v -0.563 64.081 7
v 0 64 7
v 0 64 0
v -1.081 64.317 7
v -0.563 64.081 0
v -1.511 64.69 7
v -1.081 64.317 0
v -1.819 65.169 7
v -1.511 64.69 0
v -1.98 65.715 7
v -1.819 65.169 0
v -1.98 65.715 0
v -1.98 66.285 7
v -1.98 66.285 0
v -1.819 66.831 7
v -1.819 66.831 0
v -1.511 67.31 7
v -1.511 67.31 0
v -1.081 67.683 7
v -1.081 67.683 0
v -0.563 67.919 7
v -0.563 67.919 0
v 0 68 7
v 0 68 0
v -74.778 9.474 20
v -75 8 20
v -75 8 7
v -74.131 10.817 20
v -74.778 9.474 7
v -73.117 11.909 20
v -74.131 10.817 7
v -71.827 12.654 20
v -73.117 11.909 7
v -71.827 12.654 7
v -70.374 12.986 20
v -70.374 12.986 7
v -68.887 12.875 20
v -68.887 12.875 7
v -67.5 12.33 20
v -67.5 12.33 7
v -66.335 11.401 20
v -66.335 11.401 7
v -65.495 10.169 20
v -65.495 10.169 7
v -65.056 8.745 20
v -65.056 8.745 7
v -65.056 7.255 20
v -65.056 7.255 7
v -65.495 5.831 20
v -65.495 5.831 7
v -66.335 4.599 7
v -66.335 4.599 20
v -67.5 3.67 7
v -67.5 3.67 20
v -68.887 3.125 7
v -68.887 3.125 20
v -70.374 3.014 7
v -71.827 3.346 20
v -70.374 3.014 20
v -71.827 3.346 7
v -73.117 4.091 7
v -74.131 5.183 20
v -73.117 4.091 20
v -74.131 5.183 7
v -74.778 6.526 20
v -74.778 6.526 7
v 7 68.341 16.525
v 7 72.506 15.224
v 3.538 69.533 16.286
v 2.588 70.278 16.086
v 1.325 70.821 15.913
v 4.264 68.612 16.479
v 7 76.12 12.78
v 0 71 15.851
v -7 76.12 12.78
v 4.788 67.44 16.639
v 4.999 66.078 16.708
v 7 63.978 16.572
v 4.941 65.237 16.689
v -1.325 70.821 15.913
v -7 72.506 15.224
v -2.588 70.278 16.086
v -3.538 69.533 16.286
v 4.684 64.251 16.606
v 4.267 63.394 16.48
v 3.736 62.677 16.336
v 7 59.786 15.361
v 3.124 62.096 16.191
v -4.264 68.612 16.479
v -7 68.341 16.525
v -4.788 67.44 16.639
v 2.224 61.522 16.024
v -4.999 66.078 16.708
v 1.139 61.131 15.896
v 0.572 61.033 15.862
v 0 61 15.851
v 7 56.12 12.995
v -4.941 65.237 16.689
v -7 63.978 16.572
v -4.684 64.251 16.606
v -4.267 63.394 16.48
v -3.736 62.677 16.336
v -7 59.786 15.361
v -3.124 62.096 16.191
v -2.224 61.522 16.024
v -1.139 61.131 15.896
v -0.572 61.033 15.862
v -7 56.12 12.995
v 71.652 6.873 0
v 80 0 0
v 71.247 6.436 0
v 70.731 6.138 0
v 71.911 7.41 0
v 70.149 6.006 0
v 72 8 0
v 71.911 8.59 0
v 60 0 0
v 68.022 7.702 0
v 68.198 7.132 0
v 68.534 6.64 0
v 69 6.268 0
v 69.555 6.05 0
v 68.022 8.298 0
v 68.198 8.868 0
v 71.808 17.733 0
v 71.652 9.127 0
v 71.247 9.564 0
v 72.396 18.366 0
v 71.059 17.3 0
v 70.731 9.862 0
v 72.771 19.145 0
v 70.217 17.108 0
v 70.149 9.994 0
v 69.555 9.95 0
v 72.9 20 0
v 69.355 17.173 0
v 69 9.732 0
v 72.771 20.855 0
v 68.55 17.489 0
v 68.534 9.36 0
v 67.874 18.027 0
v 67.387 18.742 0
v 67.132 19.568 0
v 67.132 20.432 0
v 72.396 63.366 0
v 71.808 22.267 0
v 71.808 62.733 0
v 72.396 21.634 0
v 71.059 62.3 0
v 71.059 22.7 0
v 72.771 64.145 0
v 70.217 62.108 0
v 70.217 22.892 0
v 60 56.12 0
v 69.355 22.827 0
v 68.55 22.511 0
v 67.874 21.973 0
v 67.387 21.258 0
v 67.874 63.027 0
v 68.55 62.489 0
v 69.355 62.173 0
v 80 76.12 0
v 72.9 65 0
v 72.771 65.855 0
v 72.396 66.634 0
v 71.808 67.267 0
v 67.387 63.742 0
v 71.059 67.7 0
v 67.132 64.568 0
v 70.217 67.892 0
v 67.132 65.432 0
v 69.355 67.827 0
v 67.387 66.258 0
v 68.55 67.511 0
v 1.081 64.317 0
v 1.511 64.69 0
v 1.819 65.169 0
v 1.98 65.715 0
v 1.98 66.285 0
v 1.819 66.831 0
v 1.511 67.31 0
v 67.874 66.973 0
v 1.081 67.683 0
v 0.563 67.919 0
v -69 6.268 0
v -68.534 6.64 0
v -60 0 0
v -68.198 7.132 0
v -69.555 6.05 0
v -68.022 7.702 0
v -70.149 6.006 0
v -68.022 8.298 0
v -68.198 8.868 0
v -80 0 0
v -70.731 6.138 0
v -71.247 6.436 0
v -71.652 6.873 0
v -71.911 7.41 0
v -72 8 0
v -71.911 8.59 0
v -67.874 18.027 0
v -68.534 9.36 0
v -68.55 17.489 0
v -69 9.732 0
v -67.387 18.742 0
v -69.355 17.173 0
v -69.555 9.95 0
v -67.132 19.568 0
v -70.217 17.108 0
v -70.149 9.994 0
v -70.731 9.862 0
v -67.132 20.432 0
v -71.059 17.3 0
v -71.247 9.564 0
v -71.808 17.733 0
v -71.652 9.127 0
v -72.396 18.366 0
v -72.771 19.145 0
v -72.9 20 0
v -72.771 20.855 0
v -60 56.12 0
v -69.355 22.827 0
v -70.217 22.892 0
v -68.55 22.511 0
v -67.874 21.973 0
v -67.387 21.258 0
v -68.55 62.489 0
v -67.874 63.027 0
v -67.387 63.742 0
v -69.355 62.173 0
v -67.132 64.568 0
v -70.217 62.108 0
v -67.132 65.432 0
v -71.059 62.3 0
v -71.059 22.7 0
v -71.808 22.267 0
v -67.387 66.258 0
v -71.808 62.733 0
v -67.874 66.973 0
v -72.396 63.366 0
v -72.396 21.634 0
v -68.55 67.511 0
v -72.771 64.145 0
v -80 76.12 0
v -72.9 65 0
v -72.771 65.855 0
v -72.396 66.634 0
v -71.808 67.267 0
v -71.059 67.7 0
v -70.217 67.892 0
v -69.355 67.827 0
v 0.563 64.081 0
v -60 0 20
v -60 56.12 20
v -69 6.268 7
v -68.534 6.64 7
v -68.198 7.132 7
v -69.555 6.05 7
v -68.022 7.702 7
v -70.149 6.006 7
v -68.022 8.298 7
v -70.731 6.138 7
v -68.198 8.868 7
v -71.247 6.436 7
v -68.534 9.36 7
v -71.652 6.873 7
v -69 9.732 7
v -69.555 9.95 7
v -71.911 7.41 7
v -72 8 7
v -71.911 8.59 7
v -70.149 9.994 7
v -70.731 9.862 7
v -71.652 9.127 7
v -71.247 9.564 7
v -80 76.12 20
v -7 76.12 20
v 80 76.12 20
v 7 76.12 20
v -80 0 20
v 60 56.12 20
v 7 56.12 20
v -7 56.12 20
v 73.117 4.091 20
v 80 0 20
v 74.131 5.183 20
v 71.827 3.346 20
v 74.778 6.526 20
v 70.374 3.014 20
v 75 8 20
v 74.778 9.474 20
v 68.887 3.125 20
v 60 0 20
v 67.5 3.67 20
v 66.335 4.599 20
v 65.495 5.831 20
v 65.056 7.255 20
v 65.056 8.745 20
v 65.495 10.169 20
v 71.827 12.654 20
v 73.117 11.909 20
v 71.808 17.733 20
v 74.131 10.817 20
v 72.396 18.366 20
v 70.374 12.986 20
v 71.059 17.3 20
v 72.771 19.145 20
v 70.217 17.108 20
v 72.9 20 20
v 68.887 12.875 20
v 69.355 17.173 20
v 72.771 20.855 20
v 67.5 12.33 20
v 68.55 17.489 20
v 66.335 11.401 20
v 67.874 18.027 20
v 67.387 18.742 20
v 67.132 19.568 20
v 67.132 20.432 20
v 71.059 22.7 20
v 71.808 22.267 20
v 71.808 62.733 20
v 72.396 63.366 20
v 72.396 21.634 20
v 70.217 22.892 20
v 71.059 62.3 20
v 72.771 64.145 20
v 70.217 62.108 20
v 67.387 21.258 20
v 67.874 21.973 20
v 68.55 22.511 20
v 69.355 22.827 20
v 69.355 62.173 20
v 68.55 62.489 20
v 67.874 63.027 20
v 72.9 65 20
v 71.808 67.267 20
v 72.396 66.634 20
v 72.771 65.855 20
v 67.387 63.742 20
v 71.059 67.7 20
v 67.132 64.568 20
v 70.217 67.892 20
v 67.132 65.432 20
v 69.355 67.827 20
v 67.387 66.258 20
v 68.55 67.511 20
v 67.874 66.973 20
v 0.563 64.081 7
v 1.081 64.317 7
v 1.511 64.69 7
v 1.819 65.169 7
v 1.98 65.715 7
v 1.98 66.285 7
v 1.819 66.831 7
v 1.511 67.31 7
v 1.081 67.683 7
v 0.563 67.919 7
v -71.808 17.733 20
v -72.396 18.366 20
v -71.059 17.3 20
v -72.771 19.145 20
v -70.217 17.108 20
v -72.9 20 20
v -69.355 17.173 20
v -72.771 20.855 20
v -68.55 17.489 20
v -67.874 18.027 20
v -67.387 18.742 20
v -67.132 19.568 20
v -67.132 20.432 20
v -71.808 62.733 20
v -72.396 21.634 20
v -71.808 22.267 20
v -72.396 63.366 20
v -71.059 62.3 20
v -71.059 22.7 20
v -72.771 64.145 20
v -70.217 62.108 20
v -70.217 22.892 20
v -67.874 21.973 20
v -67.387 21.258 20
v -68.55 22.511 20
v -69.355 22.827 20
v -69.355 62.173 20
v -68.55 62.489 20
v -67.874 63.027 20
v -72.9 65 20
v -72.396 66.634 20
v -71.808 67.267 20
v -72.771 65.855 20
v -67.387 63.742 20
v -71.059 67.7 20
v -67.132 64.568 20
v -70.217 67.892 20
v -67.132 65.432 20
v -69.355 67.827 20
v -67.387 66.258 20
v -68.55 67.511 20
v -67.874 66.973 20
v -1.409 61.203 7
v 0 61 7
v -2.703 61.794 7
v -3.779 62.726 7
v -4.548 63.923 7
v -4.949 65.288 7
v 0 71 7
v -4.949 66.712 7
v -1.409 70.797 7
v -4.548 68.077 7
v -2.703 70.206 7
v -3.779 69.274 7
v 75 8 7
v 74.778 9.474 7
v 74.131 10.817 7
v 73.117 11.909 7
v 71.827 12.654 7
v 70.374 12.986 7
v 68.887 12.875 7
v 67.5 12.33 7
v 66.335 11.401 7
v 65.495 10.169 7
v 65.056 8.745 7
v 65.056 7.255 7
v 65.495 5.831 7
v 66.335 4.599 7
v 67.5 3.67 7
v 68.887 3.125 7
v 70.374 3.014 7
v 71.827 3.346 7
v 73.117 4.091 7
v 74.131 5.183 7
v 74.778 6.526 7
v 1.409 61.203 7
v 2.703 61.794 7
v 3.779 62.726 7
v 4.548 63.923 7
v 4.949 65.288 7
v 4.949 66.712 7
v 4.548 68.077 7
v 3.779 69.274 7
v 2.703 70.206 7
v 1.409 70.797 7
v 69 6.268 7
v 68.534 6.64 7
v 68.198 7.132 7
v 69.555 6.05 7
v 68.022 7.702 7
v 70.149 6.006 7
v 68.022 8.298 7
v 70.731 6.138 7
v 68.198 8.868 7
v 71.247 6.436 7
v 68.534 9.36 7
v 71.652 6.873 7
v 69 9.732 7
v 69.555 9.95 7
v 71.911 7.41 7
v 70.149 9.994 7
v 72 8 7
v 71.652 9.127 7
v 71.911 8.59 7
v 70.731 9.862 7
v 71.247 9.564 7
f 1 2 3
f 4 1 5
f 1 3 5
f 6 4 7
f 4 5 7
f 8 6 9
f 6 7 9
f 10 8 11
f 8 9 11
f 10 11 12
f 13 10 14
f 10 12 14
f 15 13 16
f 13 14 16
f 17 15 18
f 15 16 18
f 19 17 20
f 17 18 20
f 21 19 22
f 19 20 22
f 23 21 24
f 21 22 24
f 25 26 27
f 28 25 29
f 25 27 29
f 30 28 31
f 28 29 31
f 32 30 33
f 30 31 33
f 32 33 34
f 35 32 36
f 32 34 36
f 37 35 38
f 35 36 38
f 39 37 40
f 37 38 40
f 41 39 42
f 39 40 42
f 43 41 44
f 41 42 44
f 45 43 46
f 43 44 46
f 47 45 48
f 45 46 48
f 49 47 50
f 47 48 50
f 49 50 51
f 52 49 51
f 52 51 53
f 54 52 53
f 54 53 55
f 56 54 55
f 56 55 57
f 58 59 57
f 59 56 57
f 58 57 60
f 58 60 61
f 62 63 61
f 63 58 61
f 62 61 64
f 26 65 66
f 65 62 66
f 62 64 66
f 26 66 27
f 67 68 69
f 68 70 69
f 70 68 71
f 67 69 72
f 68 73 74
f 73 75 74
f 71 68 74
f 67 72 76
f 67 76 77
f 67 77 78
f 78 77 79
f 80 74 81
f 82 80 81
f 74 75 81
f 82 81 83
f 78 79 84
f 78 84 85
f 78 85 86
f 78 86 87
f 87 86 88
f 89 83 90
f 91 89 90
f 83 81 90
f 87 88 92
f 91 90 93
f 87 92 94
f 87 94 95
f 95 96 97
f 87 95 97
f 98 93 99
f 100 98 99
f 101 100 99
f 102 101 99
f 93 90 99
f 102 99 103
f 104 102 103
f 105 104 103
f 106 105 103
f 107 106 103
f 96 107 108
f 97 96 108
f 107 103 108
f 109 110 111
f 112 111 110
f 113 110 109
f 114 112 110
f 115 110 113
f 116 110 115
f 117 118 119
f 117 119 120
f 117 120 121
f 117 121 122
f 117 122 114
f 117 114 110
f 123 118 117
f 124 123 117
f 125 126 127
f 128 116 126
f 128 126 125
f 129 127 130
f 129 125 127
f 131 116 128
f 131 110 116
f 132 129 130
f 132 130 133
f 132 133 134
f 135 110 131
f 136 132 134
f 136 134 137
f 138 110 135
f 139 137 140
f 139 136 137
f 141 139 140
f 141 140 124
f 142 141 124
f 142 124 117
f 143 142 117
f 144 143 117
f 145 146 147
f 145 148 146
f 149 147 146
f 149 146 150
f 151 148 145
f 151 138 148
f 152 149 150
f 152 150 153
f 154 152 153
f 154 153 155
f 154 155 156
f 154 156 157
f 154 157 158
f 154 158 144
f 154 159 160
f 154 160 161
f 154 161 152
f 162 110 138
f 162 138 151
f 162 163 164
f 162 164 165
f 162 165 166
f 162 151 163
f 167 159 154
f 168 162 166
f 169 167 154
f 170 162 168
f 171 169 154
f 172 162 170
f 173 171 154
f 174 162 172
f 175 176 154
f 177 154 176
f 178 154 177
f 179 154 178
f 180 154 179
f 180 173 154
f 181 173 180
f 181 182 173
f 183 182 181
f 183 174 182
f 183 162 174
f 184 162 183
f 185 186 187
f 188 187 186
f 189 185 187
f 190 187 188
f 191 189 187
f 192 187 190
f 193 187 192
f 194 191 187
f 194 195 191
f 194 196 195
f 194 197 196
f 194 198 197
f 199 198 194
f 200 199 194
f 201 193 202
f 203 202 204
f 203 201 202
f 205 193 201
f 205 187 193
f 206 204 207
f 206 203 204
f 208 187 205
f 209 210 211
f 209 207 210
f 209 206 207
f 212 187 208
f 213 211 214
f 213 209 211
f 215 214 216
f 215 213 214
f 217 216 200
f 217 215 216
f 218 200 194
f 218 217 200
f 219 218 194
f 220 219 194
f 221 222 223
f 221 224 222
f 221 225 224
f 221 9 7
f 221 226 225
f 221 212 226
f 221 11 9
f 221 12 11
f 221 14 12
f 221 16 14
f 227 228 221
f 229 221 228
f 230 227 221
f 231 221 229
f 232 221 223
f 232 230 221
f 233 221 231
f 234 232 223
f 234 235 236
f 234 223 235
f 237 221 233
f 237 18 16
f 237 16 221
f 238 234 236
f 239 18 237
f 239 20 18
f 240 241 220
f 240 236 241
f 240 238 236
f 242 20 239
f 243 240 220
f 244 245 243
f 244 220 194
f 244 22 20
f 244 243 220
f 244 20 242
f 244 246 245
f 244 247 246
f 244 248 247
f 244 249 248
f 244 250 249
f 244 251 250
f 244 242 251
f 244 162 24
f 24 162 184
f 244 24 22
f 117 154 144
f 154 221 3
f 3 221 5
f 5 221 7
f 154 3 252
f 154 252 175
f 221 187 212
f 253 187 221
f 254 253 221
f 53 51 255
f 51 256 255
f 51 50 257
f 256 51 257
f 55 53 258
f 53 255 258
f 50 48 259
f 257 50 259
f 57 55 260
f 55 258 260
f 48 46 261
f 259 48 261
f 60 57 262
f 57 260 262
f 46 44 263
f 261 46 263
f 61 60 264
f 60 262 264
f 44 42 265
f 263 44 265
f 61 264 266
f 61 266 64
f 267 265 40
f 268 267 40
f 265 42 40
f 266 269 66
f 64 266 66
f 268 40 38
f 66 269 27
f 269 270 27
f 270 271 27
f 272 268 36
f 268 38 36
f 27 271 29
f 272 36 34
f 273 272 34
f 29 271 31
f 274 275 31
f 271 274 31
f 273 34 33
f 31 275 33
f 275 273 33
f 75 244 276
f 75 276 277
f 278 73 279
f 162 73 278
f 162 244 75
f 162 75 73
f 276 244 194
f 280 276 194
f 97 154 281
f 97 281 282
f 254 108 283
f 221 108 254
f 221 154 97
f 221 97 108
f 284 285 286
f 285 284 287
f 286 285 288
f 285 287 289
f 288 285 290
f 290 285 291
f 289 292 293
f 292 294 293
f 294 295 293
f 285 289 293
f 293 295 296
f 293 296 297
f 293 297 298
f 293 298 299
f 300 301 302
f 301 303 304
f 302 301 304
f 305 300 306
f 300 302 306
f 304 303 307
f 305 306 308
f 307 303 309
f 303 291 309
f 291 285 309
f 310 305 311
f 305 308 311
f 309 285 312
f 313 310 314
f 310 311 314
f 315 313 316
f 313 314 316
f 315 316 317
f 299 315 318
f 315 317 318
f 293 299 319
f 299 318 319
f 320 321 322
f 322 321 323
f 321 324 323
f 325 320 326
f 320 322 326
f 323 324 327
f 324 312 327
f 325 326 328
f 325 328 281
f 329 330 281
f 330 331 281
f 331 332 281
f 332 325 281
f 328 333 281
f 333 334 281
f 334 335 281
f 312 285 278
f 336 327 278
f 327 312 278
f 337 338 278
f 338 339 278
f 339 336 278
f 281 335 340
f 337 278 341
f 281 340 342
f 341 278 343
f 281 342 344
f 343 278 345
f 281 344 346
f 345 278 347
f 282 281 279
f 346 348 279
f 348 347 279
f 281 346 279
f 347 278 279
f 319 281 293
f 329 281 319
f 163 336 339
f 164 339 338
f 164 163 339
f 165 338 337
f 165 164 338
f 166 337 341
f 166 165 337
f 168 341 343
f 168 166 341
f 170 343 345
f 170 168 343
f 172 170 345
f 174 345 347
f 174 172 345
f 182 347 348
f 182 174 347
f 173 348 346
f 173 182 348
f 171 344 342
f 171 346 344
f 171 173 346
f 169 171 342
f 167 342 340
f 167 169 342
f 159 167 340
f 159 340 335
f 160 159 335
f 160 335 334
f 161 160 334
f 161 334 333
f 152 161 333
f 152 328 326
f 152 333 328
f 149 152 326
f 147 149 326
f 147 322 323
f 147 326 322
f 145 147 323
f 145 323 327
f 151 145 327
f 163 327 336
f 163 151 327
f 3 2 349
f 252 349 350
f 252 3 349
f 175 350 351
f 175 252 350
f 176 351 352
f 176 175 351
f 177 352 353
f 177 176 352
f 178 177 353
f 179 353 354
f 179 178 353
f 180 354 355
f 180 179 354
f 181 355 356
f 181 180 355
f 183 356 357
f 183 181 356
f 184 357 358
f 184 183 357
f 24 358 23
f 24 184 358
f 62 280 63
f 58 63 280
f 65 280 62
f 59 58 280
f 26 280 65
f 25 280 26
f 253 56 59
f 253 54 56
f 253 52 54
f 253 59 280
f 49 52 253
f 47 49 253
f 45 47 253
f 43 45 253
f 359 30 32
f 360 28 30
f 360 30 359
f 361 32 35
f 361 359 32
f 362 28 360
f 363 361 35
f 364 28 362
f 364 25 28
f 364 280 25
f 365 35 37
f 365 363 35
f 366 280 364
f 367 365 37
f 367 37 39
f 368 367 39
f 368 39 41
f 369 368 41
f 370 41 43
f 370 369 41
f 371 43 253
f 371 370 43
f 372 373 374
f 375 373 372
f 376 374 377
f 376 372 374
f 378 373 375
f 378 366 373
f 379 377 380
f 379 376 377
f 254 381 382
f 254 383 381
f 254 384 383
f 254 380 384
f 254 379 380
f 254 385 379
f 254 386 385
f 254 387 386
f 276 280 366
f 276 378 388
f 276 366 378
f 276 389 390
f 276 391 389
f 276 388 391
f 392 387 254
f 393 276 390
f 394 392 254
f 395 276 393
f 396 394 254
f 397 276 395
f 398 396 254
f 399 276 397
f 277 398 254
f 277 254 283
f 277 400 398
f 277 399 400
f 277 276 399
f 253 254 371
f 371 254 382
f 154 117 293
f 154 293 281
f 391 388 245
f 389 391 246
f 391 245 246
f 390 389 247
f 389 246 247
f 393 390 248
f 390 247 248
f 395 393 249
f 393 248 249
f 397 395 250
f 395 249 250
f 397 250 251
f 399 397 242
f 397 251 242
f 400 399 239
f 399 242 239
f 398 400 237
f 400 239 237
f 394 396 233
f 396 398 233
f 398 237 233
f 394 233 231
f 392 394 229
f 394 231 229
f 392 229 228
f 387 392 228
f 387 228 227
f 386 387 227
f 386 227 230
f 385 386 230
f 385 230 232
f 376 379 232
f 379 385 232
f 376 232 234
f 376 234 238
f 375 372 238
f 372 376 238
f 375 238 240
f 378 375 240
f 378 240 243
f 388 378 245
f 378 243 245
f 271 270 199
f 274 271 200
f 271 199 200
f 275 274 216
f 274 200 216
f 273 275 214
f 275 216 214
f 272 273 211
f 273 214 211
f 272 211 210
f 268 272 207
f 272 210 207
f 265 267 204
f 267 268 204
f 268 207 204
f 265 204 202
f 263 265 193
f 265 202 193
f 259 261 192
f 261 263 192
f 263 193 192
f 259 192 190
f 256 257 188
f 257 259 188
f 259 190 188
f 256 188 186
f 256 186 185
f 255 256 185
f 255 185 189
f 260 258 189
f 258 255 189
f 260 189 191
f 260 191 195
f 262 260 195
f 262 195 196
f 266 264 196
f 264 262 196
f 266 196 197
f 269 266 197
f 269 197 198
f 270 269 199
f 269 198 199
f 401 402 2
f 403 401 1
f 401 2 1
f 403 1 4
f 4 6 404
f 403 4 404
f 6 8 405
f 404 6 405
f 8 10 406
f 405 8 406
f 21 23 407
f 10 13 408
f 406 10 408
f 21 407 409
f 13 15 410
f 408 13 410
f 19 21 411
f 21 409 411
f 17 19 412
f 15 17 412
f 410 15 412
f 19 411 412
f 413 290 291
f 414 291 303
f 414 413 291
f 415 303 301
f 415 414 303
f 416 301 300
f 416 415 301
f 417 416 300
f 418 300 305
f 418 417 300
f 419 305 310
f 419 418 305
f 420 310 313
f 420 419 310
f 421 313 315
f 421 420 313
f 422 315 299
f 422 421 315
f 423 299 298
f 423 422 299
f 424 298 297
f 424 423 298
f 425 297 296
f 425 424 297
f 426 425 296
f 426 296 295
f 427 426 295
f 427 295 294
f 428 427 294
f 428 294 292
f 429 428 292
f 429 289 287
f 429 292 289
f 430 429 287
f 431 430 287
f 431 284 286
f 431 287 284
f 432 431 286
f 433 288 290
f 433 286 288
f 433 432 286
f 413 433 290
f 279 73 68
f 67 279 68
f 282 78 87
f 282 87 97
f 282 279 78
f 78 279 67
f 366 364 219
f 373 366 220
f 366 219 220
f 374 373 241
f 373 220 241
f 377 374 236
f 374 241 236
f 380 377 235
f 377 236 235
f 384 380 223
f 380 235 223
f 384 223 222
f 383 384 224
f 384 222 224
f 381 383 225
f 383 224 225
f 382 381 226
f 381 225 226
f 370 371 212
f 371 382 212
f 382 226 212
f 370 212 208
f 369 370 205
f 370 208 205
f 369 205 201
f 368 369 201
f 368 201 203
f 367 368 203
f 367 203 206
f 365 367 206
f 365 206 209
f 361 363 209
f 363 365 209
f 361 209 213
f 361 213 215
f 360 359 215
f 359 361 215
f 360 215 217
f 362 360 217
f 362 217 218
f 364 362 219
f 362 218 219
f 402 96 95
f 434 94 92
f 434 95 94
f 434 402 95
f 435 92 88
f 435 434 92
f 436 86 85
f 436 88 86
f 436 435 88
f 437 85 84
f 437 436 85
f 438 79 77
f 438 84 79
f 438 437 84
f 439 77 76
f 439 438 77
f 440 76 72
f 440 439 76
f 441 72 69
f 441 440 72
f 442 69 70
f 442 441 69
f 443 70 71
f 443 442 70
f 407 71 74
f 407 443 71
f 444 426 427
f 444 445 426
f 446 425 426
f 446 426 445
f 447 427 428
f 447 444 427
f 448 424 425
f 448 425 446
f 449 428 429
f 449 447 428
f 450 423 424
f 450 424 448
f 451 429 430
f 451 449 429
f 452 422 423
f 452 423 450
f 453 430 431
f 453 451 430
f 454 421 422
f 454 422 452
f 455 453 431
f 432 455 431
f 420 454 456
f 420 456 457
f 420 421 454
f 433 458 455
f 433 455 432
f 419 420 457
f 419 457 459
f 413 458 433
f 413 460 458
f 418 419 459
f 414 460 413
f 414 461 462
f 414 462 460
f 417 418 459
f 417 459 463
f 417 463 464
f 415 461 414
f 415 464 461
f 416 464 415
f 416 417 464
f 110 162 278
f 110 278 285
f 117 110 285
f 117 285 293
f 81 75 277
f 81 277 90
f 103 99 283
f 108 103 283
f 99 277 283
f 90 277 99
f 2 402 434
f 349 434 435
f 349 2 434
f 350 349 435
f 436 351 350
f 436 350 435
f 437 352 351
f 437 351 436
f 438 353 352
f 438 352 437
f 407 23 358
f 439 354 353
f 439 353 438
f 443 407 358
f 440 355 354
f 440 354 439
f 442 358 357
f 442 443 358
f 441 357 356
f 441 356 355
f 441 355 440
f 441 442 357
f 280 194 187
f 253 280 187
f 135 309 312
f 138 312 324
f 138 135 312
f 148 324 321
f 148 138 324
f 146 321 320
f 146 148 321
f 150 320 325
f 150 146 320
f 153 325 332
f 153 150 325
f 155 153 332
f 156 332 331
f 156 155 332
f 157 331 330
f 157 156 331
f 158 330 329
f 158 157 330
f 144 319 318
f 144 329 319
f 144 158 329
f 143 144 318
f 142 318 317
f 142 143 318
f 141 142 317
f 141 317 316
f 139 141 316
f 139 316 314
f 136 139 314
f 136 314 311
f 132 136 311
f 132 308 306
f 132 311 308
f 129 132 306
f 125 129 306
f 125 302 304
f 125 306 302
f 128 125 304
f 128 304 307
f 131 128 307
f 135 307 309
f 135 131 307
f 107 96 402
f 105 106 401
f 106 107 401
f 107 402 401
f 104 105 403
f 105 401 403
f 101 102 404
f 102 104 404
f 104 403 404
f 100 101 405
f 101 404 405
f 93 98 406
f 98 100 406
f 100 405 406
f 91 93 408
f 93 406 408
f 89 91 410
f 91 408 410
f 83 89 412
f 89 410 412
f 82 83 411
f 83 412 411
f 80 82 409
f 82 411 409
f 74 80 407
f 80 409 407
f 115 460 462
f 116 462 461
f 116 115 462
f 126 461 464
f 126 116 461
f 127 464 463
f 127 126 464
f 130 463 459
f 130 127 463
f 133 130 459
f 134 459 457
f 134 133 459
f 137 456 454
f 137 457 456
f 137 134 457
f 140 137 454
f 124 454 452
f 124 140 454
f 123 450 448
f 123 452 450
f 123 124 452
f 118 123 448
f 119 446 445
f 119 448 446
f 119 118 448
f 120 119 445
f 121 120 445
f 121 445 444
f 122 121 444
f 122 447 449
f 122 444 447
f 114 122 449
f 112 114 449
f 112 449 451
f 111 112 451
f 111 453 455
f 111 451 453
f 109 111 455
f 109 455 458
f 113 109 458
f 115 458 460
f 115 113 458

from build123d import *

# Parameters (mm, degrees)
PAD003_DEPTH  = 7
SKETCH002_R   = 5
PAD002_DEPTH  = 50
SKETCH001_R   = 2.9
SKETCH001_R_2 = 2
PAD001_DEPTH  = 100
PAD_DEPTH     = 20


with BuildPart() as clamp_slot:
    # Sketch003 → Pad003 (new body)
    with BuildSketch(Plane.YZ):
        with BuildLine():
            ThreePointArc((78.5, 10), (66, 16.708438), (53.5, 10))
            Line((53.5, 10), (53.5, 25))
            Line((53.5, 25), (78.5, 25))
            Line((78.5, 25), (78.5, 10))
        make_face()
    extrude(amount=PAD003_DEPTH)


with BuildPart() as screw_recesses:
    # Sketch002 → Pad002 (new body)
    with BuildSketch(Plane.XY.offset(7)):
        with Locations((0, 66)):
            Circle(SKETCH002_R)
        with Locations((70, 8)):
            Circle(SKETCH002_R)
    extrude(amount=PAD002_DEPTH)


with BuildPart() as screw_holes:
    # Sketch001 → Pad001 (new body)
    with BuildSketch(Plane.XY):
        with Locations((70, 65)):
            Circle(SKETCH001_R)
        with Locations((70, 20)):
            Circle(SKETCH001_R)
        with Locations((70, 8)):
            Circle(SKETCH001_R_2)
        with Locations((0, 66)):
            Circle(SKETCH001_R_2)
    extrude(amount=PAD001_DEPTH)


with BuildPart() as cut002:
    # Sketch → Pad (new body)
    with BuildSketch(Plane.XY):
        Polygon((0, 76.12), (80, 76.12), (80, 0), (60, 0), (60, 56.12), (0, 56.12), align=None)
    extrude(amount=PAD_DEPTH)

    # Cut: cut Screw Holes
    add(screw_holes.part, mode=Mode.SUBTRACT)

    # Cut001: cut Screw Recesses
    add(screw_recesses.part, mode=Mode.SUBTRACT)

    # Cut002: cut Clamp Slot
    add(clamp_slot.part, mode=Mode.SUBTRACT)


with BuildPart() as fusion:
    # Part__Mirroring: instance of Cut002
    add(cut002.part.mirror(Plane(origin=(0, 0, 0), x_dir=(0, -1, 0), z_dir=(1, 0, 0))))

    # Fusion: union Cut002
    add(cut002.part)


solid = fusion.part
